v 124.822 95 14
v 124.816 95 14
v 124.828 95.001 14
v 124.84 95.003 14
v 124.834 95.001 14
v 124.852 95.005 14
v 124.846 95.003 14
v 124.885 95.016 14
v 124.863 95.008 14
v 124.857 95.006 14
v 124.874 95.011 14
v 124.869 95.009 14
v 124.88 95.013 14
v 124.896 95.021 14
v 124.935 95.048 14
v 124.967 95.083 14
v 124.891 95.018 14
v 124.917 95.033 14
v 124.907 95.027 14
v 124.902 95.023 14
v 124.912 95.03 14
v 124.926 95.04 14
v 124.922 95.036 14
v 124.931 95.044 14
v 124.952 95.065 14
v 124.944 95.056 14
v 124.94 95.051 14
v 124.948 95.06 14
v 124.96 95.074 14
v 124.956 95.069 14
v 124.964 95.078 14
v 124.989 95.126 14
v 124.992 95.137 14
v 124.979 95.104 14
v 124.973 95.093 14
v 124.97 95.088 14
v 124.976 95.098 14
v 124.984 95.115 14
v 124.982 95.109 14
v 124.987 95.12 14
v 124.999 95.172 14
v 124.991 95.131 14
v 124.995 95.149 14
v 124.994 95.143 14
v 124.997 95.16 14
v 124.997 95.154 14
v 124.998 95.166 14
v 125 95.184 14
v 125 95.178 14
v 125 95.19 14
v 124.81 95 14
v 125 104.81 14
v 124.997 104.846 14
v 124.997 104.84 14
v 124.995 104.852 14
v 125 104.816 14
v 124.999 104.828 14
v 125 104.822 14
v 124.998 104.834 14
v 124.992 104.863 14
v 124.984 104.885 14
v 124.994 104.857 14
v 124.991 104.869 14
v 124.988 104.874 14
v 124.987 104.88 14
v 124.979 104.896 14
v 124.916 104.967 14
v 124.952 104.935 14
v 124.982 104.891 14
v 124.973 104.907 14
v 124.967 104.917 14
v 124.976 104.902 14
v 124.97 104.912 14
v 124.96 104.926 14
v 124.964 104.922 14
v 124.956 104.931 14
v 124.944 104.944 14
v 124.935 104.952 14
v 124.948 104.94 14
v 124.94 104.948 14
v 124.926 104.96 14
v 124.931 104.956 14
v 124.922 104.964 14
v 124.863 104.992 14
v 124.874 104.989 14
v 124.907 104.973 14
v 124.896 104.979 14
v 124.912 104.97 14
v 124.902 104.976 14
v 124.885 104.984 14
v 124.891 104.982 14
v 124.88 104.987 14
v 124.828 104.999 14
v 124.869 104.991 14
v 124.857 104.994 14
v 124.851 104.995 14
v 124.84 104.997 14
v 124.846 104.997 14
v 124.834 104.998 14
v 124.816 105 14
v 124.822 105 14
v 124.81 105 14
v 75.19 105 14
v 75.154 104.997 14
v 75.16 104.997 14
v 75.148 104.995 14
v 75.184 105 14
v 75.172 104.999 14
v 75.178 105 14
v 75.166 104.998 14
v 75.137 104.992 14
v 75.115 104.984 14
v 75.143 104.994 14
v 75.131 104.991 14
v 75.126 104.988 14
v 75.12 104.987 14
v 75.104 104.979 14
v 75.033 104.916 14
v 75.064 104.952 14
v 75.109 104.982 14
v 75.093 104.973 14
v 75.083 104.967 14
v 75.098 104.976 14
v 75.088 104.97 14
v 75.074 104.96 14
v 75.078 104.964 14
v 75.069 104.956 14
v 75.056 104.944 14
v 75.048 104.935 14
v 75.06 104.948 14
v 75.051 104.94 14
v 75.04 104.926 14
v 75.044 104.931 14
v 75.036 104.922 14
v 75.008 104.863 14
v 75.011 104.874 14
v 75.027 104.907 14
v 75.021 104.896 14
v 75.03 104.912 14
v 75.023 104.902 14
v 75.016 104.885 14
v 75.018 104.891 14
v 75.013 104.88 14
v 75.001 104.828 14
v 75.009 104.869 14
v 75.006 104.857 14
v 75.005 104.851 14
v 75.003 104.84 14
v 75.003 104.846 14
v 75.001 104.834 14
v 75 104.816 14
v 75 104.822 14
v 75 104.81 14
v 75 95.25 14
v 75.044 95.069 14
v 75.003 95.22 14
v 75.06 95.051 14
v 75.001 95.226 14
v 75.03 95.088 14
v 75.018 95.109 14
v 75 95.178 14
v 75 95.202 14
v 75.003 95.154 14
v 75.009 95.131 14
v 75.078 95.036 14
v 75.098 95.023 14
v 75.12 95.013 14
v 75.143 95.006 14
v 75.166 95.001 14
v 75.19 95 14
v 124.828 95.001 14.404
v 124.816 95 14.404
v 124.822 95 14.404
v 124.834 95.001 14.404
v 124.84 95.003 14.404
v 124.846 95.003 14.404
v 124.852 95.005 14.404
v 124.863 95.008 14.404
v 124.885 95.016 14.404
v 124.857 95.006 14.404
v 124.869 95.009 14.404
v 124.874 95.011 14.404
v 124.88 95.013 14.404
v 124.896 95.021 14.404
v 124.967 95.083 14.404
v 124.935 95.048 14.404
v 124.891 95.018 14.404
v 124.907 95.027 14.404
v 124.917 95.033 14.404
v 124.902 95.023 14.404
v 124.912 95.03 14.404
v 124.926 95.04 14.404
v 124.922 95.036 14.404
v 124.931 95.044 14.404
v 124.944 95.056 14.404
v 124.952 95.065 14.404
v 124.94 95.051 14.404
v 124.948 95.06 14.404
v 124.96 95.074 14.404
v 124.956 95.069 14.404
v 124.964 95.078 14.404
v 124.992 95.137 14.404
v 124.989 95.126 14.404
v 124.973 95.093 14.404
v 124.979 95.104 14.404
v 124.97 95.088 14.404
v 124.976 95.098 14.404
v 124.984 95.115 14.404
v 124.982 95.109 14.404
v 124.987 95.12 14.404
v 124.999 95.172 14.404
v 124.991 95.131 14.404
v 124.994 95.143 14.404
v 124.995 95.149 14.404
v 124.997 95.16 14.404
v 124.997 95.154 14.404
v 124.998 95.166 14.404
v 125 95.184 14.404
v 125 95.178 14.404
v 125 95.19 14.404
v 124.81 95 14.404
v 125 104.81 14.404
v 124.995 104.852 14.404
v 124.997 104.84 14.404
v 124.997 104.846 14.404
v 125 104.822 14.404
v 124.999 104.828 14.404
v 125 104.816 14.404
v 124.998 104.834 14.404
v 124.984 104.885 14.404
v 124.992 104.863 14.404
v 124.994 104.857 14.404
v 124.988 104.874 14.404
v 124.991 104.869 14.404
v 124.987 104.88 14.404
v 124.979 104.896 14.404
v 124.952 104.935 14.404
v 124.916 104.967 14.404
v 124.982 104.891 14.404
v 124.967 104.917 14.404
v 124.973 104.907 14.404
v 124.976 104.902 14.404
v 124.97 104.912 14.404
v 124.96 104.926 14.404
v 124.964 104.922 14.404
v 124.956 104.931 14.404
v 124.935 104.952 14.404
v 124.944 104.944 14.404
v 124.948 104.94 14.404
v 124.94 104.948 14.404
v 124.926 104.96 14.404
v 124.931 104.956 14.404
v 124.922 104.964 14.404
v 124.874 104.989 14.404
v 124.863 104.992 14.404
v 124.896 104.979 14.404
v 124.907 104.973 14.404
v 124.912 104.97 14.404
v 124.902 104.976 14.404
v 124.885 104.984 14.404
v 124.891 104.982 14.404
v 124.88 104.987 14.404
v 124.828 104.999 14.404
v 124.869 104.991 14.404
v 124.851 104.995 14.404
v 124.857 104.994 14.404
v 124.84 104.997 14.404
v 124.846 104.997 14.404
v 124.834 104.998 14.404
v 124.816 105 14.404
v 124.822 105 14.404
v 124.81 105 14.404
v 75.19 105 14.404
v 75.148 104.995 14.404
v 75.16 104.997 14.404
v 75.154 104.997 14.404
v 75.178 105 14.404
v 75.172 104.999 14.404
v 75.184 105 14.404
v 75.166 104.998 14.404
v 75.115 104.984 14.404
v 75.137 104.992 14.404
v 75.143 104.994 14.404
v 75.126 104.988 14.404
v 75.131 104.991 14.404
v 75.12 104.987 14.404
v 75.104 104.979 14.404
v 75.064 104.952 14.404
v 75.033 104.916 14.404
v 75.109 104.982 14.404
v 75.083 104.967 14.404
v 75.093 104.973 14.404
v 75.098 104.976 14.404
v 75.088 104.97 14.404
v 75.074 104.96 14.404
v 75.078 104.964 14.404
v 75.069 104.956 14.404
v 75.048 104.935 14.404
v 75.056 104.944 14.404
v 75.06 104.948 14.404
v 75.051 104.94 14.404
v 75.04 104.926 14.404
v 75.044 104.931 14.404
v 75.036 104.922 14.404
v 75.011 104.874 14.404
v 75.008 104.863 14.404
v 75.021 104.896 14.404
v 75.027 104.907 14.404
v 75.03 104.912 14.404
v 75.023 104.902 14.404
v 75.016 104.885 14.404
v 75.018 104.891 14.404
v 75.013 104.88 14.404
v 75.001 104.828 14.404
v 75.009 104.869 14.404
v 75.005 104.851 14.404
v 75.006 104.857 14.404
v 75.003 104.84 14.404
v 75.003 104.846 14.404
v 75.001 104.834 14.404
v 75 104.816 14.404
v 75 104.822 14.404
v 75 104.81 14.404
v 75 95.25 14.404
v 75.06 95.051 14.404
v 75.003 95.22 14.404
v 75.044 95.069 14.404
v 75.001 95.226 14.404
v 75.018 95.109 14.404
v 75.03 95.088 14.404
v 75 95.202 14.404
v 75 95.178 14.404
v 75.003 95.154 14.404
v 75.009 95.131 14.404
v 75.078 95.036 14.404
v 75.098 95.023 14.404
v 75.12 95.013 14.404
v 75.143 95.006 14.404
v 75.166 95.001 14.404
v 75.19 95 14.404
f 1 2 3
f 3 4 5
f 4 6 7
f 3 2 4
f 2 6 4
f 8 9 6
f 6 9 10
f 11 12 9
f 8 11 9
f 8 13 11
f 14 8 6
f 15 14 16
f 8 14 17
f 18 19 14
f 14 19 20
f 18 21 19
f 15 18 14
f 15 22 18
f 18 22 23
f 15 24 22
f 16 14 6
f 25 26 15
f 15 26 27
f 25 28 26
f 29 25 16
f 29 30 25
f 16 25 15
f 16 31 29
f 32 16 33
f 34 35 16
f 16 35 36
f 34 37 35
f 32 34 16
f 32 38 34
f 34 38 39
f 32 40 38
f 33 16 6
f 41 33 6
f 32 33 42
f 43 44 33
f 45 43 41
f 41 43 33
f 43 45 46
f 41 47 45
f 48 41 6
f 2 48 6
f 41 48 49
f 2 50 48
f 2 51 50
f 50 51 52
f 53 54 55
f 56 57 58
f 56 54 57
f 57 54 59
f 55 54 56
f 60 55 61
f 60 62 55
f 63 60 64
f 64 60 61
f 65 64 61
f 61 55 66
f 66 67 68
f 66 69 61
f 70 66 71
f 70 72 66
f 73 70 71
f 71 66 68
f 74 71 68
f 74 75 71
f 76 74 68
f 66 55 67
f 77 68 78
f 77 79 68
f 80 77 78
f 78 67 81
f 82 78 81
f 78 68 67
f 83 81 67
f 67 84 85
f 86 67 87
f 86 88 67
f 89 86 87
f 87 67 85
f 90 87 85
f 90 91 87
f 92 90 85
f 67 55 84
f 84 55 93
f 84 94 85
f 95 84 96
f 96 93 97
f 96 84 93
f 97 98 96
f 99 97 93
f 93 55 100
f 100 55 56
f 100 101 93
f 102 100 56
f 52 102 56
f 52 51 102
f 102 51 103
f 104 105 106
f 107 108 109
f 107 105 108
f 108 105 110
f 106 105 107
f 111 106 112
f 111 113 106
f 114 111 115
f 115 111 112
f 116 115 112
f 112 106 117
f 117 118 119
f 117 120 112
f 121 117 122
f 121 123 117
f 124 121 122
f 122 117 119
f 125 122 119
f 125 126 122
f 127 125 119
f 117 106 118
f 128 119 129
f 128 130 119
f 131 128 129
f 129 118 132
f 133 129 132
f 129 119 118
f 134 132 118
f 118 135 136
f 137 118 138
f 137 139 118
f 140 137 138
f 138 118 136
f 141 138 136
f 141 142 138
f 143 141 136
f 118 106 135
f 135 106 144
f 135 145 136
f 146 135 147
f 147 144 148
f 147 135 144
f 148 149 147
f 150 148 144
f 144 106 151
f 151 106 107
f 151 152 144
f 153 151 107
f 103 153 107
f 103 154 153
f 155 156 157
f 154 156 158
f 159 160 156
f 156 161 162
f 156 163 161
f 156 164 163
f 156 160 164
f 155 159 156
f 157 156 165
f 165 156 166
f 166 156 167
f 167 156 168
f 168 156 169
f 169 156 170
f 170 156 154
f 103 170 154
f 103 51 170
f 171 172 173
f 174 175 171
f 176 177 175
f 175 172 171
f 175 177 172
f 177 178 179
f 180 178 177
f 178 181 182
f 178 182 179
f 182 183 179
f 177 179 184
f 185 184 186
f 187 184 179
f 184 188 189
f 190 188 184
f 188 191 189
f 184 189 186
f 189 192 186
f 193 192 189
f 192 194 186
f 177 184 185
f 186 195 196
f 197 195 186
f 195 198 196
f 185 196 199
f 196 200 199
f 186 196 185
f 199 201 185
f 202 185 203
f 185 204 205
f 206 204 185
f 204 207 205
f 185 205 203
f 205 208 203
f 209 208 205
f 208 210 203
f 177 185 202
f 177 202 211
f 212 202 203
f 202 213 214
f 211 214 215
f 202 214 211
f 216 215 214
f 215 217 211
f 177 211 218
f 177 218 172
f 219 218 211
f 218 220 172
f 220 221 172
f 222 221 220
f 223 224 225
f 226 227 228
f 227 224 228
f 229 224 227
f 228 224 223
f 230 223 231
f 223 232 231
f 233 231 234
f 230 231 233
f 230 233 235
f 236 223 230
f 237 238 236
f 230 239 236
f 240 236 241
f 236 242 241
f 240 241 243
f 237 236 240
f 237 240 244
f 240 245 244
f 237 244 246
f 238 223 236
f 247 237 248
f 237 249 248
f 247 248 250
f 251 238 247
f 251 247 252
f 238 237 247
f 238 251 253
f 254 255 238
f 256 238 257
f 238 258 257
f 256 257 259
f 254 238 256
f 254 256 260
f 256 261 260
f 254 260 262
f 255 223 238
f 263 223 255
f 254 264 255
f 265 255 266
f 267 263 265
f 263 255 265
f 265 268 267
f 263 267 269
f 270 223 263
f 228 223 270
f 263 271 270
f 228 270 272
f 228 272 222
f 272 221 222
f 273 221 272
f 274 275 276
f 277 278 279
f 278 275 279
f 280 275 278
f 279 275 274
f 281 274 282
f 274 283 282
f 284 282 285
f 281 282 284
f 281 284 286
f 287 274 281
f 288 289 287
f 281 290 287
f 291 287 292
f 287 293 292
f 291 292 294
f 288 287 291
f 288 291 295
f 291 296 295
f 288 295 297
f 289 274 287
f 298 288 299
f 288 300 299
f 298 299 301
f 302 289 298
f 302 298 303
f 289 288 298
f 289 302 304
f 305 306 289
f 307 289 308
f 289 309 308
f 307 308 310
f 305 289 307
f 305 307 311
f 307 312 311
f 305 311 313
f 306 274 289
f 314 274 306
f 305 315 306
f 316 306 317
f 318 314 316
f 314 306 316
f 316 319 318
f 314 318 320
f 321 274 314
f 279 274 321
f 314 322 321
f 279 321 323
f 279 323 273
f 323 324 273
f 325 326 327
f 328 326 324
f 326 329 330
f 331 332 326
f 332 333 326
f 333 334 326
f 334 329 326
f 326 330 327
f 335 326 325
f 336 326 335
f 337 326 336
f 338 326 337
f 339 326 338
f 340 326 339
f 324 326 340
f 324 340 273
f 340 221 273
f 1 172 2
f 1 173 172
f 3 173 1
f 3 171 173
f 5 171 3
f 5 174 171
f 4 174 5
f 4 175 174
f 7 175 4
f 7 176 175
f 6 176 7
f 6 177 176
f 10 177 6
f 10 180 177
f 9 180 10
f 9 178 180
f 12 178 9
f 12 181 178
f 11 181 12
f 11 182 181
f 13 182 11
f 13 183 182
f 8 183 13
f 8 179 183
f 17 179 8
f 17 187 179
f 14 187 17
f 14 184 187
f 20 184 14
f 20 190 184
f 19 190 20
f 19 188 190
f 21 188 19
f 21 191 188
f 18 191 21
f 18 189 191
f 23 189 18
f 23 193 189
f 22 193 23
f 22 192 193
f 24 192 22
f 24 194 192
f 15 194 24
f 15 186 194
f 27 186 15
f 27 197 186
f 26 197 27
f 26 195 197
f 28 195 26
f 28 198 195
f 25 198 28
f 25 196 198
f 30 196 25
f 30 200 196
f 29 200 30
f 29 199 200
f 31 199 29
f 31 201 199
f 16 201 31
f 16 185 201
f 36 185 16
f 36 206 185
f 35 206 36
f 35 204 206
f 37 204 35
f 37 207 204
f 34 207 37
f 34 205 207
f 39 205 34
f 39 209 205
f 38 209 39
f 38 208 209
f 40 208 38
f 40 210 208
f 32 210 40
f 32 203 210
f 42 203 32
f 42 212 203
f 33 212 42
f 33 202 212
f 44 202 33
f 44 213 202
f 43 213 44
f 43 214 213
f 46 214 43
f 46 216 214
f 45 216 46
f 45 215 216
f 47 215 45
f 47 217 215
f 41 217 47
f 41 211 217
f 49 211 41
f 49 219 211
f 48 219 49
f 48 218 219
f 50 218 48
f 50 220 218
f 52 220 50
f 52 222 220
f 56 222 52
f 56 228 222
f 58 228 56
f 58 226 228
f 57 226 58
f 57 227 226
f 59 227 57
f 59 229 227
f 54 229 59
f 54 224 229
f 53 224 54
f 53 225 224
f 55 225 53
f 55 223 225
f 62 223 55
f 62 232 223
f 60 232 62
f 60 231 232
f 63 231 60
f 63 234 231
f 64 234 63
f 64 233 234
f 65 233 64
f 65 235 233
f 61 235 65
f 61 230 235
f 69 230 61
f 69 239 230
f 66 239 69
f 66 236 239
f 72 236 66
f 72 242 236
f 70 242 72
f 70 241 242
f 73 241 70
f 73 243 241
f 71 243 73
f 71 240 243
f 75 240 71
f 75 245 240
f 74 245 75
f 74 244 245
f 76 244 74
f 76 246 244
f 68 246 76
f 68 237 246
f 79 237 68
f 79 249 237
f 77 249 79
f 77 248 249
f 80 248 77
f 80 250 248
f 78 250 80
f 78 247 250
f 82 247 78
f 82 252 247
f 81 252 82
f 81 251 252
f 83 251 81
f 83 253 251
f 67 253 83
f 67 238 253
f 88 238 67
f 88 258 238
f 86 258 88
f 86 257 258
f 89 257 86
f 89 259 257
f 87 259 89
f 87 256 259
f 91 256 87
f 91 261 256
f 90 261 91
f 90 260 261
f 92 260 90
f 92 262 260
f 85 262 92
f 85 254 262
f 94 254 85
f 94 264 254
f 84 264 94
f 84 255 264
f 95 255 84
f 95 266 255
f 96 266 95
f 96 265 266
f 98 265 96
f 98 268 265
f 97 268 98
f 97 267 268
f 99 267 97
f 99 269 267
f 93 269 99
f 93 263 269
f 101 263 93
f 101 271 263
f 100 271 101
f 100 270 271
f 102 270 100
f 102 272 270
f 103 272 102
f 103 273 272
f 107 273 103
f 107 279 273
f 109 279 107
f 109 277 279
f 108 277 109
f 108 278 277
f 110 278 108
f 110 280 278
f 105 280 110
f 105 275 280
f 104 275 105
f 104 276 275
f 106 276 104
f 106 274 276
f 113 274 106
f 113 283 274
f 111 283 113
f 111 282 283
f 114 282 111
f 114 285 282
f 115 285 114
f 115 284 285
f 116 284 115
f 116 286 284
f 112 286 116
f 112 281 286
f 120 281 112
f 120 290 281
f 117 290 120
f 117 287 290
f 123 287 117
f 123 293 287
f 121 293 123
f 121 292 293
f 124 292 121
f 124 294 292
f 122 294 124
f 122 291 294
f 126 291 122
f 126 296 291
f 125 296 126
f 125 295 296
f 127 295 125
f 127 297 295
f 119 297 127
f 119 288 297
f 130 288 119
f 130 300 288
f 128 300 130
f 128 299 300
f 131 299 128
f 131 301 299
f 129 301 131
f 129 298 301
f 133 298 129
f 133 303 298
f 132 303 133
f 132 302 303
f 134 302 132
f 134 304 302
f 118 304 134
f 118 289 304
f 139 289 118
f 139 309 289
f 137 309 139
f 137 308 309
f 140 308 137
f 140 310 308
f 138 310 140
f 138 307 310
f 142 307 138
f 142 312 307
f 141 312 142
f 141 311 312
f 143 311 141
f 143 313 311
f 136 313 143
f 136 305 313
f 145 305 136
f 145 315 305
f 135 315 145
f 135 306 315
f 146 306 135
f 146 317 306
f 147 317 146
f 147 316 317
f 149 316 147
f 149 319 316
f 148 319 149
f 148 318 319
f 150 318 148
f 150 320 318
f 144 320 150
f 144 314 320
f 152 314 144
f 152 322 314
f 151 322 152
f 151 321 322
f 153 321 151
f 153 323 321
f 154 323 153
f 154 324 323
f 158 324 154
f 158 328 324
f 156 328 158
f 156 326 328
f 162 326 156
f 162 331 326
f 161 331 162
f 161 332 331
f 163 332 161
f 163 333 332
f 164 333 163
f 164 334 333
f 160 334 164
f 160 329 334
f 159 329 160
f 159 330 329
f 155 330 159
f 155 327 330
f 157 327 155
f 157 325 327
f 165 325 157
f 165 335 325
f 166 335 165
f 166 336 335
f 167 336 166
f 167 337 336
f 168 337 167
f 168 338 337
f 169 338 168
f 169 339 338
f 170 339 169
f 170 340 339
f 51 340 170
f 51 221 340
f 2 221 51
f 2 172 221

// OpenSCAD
module drawBasicShape(x1, y1, x2, y2, width)
{
	length = sqrt((x1-x2)*(x1-x2) + (y1-y2)*(y1-y2));
	if (width!=0.0) {
		square(size = [width, length], center = false);
		translate([width/2.0, 0, 0]) circle(d=width);
		translate([width/2.0, length, 0]) circle(d=width);
	}
}

module translateAndRotate(x1, y1, x2, y2, width)
{
	if (width != 0.0) {
		angle = atan((y2-y1)/(x2-x1)) +270;
		if (x2>=x1) {
			translate([x1, y1, 0.0]) rotate([0.0, 0.0, angle]) translate([-width/2.0, 0.0, 0.0]) scale([1.0, 1.0, 1.0]) drawBasicShape(x1, y1, x2, y2, width);
		}
		else {
			translate([x1, y1, 0.0]) rotate([0.0, 0.0, angle+180]) translate([-width/2.0, 0.0, 0.0]) scale([1.0, 1.0, 1.0]) drawBasicShape(x1, y1, x2, y2, width);		}
	}
}

$fn=50;

points34 = [
[75.77800000, 95.77800000, 0.00000000],
[124.22200000, 95.77800000, 0.37999548],
[124.22200000, 104.22200000, 0.37997788],
[75.77800000, 104.22200000, 0.37999672],
[75.77800000, 95.83800000, 0.37997423],
[75.48400000, 95.48400000, 0.00000000],
[124.51600000, 95.48400000, 0.37999868],
[124.51600000, 104.51600000, 0.37998977],
[75.48400000, 104.51600000, 0.37999746],
[75.48400000, 95.54400000, 0.37999314],
[75.19000000, 95.19000000, 0.00000000],
[124.81000000, 95.19000000, 0.37999939],
[124.81000000, 104.81000000, 0.38000021],
[75.19000000, 104.81000000, 0.38000060],
[75.19000000, 95.25000000, 0.37999715],
[75.53600000, 95.39000000, 0.00000000],
[75.94600000, 103.88900000, 0.00000000],
[76.11100000, 104.05400000, 0.37961375],
[76.52800000, 104.05400000, 0.38001190],
[75.94600000, 103.47200000, 0.37989934],
[75.94600000, 103.05500000, 0.38015610],
[76.94500000, 104.05400000, 0.37994651],
[77.36200000, 104.05400000, 0.38001190],
[75.94600000, 102.63800000, 0.37999592],
[75.94600000, 102.22100000, 0.38001190],
[77.77900000, 104.05400000, 0.37999966],
[78.19600000, 104.05400000, 0.38001190],
[75.94600000, 101.80400000, 0.38002091],
[75.94600000, 101.38700000, 0.38001190],
[78.61300000, 104.05400000, 0.38001957],
[79.03000000, 104.05400000, 0.38001190],
[75.94600000, 100.97000000, 0.38001859],
[75.94600000, 100.55300000, 0.38001190],
[79.44700000, 104.05400000, 0.38002999],
[79.86400000, 104.05400000, 0.38001190],
[75.94600000, 100.13600000, 0.38002811],
[75.94600000, 99.71900000, 0.38001190],
[80.28100000, 104.05400000, 0.38002660],
[80.69800000, 104.05400000, 0.38001190],
[75.94600000, 99.30200000, 0.38003429],
[75.94600000, 98.88500000, 0.38001190],
[81.11500000, 104.05400000, 0.38003252],
[81.53300000, 104.05400000, 0.37930814],
[75.94600000, 98.46700000, 0.37997836],
[75.94600000, 98.05000000, 0.38001190],
[81.95000000, 104.05400000, 0.37998072],
[82.36700000, 104.05400000, 0.38015610],
[75.94600000, 97.63300000, 0.37998277],
[75.94600000, 97.21600000, 0.38015610],
[82.78400000, 104.05400000, 0.37999079],
[83.20100000, 104.05400000, 0.38001190],
[75.94600000, 96.79900000, 0.37999203],
[75.94600000, 96.38200000, 0.38001190],
[83.61800000, 104.05400000, 0.37999868],
[84.03500000, 104.05400000, 0.38001190],
[75.95600000, 95.97600000, 0.38000275],
[76.34400000, 95.94600000, 0.37958004],
[84.45200000, 104.05400000, 0.38000754],
[84.86900000, 104.05400000, 0.38001190],
[76.76100000, 95.94600000, 0.38000229],
[77.17800000, 95.94600000, 0.38001190],
[85.28600000, 104.05400000, 0.38000754],
[85.70300000, 104.05400000, 0.38001190],
[77.59500000, 95.94600000, 0.38000229],
[78.01200000, 95.94600000, 0.38015610],
[86.12000000, 104.05400000, 0.38000229],
[86.53700000, 104.05400000, 0.38001190],
[78.42900000, 95.94600000, 0.38000754],
[78.84600000, 95.94600000, 0.38001190],
[86.95400000, 104.05400000, 0.38000229],
[87.37100000, 104.05400000, 0.38001190],
[79.26300000, 95.94600000, 0.38000754],
[79.68000000, 95.94600000, 0.38001190],
[87.78900000, 104.05400000, 0.37998415],
[88.20600000, 104.05400000, 0.38015610],
[80.09700000, 95.94600000, 0.37998415],
[80.51500000, 95.94600000, 0.37930814],
[88.62300000, 104.05400000, 0.38000229],
[89.04000000, 104.05400000, 0.38015610],
[80.93200000, 95.94600000, 0.38000229],
[81.34900000, 95.94600000, 0.38001190],
[89.45700000, 104.05400000, 0.38000754],
[89.87400000, 104.05400000, 0.38001190],
[81.76600000, 95.94600000, 0.38000229],
[82.18300000, 95.94600000, 0.38015610],
[90.29100000, 104.05400000, 0.38000229],
[90.70800000, 104.05400000, 0.38001190],
[82.60000000, 95.94600000, 0.38000229],
[83.01700000, 95.94600000, 0.38015610],
[91.12500000, 104.05400000, 0.38000229],
[91.54200000, 104.05400000, 0.38001190],
[83.43400000, 95.94600000, 0.38000754],
[83.85100000, 95.94600000, 0.38001190],
[91.95900000, 104.05400000, 0.38000229],
[92.37600000, 104.05400000, 0.38001190],
[84.26800000, 95.94600000, 0.38000754],
[84.68500000, 95.94600000, 0.38001190],
[92.79300000, 104.05400000, 0.38000229],
[93.21000000, 104.05400000, 0.38015610],
[85.10200000, 95.94600000, 0.38000229],
[85.51900000, 95.94600000, 0.38001190],
[93.62700000, 104.05400000, 0.38000754],
[94.04400000, 104.05400000, 0.38001190],
[85.93600000, 95.94600000, 0.38000229],
[86.35300000, 95.94600000, 0.38001190],
[94.46200000, 104.05400000, 0.37998940],
[94.87900000, 104.05400000, 0.38001190],
[86.77000000, 95.94600000, 0.37998415],
[87.18800000, 95.94600000, 0.37945200],
[95.29600000, 104.05400000, 0.38000229],
[95.71300000, 104.05400000, 0.38001190],
[87.60500000, 95.94600000, 0.38000754],
[88.02200000, 95.94600000, 0.38001190],
[96.13000000, 104.05400000, 0.38000229],
[96.54700000, 104.05400000, 0.38001190],
[88.43900000, 95.94600000, 0.38000754],
[88.85600000, 95.94600000, 0.38001190],
[96.96400000, 104.05400000, 0.38000229],
[97.38100000, 104.05400000, 0.38015610],
[89.27300000, 95.94600000, 0.38000229],
[89.69000000, 95.94600000, 0.38001190],
[97.79800000, 104.05400000, 0.38000754],
[98.21500000, 104.05400000, 0.38001190],
[90.10700000, 95.94600000, 0.38000229],
[90.52400000, 95.94600000, 0.38001190],
[98.63200000, 104.05400000, 0.38000754],
[99.04900000, 104.05400000, 0.38001190],
[90.94100000, 95.94600000, 0.38000229],
[91.35800000, 95.94600000, 0.38015610],
[99.46600000, 104.05400000, 0.38000229],
[99.88300000, 104.05400000, 0.38001190],
[91.77500000, 95.94600000, 0.38000754],
[92.19200000, 95.94600000, 0.38001190],
[100.30000000, 104.05400000, 0.38000229],
[100.71800000, 104.05400000, 0.37930814],
[92.60900000, 95.94600000, 0.37998940],
[93.02600000, 95.94600000, 0.38001190],
[101.13500000, 104.05400000, 0.37998415],
[101.55200000, 104.05400000, 0.38015610],
[93.44400000, 95.94600000, 0.38000229],
[93.86100000, 95.94600000, 0.38001190],
[101.96900000, 104.05400000, 0.38000754],
[102.38600000, 104.05400000, 0.38001190],
[94.27800000, 95.94600000, 0.38000229],
[94.69500000, 95.94600000, 0.38001190],
[102.80300000, 104.05400000, 0.38000754],
[103.22000000, 104.05400000, 0.38001190],
[95.11200000, 95.94600000, 0.38000229],
[95.52900000, 95.94600000, 0.38015610],
[103.63700000, 104.05400000, 0.38000229],
[104.05400000, 104.05400000, 0.38001190],
[95.94600000, 95.94600000, 0.38000754],
[96.36300000, 95.94600000, 0.38001190],
[104.47100000, 104.05400000, 0.38000229],
[104.88800000, 104.05400000, 0.38001190],
[96.78000000, 95.94600000, 0.38000754],
[97.19700000, 95.94600000, 0.38001190],
[105.30500000, 104.05400000, 0.38000229],
[105.72200000, 104.05400000, 0.38015610],
[97.61400000, 95.94600000, 0.38000229],
[98.03100000, 95.94600000, 0.38001190],
[106.13900000, 104.05400000, 0.38000229],
[106.55600000, 104.05400000, 0.38015610],
[98.44800000, 95.94600000, 0.38000229],
[98.86500000, 95.94600000, 0.38001190],
[106.97300000, 104.05400000, 0.38000754],
[107.39100000, 104.05400000, 0.37930814],
[99.28200000, 95.94600000, 0.37998415],
[99.69900000, 95.94600000, 0.38001190],
[107.80800000, 104.05400000, 0.37998940],
[108.22500000, 104.05400000, 0.38001190],
[100.11700000, 95.94600000, 0.38000229],
[100.53400000, 95.94600000, 0.38015610],
[108.64200000, 104.05400000, 0.38000229],
[109.05900000, 104.05400000, 0.38001190],
[100.95100000, 95.94600000, 0.38000754],
[101.36800000, 95.94600000, 0.38001190],
[109.47600000, 104.05400000, 0.38000229],
[109.89300000, 104.05400000, 0.38001190],
[101.78500000, 95.94600000, 0.38000754],
[102.20200000, 95.94600000, 0.38001190],
[110.31000000, 104.05400000, 0.38000229],
[110.72700000, 104.05400000, 0.38015610],
[102.61900000, 95.94600000, 0.38000229],
[103.03600000, 95.94600000, 0.38001190],
[111.14400000, 104.05400000, 0.38000754],
[111.56100000, 104.05400000, 0.38001190],
[103.45300000, 95.94600000, 0.38000229],
[103.87000000, 95.94600000, 0.38001190],
[111.97800000, 104.05400000, 0.38000754],
[112.39500000, 104.05400000, 0.38001190],
[104.28700000, 95.94600000, 0.38000229],
[104.70400000, 95.94600000, 0.38015610],
[112.81200000, 104.05400000, 0.38000229],
[113.22900000, 104.05400000, 0.38001190],
[105.12100000, 95.94600000, 0.38000754],
[105.53800000, 95.94600000, 0.38001190],
[113.64700000, 104.05400000, 0.37998415],
[114.06400000, 104.05400000, 0.38001190],
[105.95500000, 95.94600000, 0.37998940],
[106.37300000, 95.94600000, 0.37930814],
[114.48100000, 104.05400000, 0.38000229],
[114.89800000, 104.05400000, 0.38015610],
[106.79000000, 95.94600000, 0.38000229],
[107.20700000, 95.94600000, 0.38001190],
[115.31500000, 104.05400000, 0.38000754],
[115.73200000, 104.05400000, 0.38001190],
[107.62400000, 95.94600000, 0.38000229],
[108.04100000, 95.94600000, 0.38001190],
[116.14900000, 104.05400000, 0.38000754],
[116.56600000, 104.05400000, 0.38001190],
[108.45800000, 95.94600000, 0.38000229],
[108.87500000, 95.94600000, 0.38015610],
[116.98300000, 104.05400000, 0.38000229],
[117.40000000, 104.05400000, 0.38001190],
[109.29200000, 95.94600000, 0.38000754],
[109.70900000, 95.94600000, 0.38001190],
[117.81700000, 104.05400000, 0.38000229],
[118.23400000, 104.05400000, 0.38001190],
[110.12600000, 95.94600000, 0.38000754],
[110.54300000, 95.94600000, 0.38001190],
[118.65100000, 104.05400000, 0.38000229],
[119.06800000, 104.05400000, 0.38015610],
[110.96000000, 95.94600000, 0.38000229],
[111.37700000, 95.94600000, 0.38001190],
[119.48500000, 104.05400000, 0.38000229],
[119.90200000, 104.05400000, 0.38015610],
[111.79400000, 95.94600000, 0.38000229],
[112.21100000, 95.94600000, 0.38001190],
[120.32000000, 104.05400000, 0.37998940],
[120.73700000, 104.05400000, 0.38001190],
[112.62900000, 95.94600000, 0.38000229],
[113.04600000, 95.94600000, 0.38001190],
[121.15400000, 104.05400000, 0.38000754],
[121.57100000, 104.05400000, 0.38001190],
[113.46300000, 95.94600000, 0.38000229],
[113.88000000, 95.94600000, 0.38015610],
[121.98800000, 104.05400000, 0.38000229],
[122.40500000, 104.05400000, 0.38001190],
[114.29700000, 95.94600000, 0.38000754],
[114.71400000, 95.94600000, 0.38001190],
[122.82200000, 104.05400000, 0.38000229],
[123.23900000, 104.05400000, 0.38001190],
[115.13100000, 95.94600000, 0.38000754],
[115.54800000, 95.94600000, 0.38001190],
[123.65600000, 104.05400000, 0.38000229],
[124.04400000, 104.02500000, 0.37979183],
[115.96500000, 95.94600000, 0.37998455],
[116.38200000, 95.94600000, 0.38001190],
[124.05400000, 103.61800000, 0.37999868],
[124.05400000, 103.20100000, 0.38001190],
[116.79900000, 95.94600000, 0.37999789],
[117.21600000, 95.94600000, 0.38001190],
[124.05400000, 102.78400000, 0.37999079],
[124.05400000, 102.36700000, 0.38015610],
[117.63300000, 95.94600000, 0.37998939],
[118.05000000, 95.94600000, 0.38001190],
[124.05400000, 101.95000000, 0.37998780],
[124.05400000, 101.53300000, 0.38001190],
[118.46700000, 95.94600000, 0.37997836],
[118.88400000, 95.94600000, 0.38001190],
[124.05400000, 101.11600000, 0.37997562],
[124.05400000, 100.69800000, 0.37945200],
[119.30200000, 95.94600000, 0.38002534],
[119.71900000, 95.94600000, 0.38015610],
[124.05400000, 100.28100000, 0.38002660],
[124.05400000, 99.86400000, 0.38001190],
[120.13600000, 95.94600000, 0.38002811],
[120.55300000, 95.94600000, 0.38015610],
[124.05400000, 99.44700000, 0.38001785],
[124.05400000, 99.03000000, 0.38015610],
[120.97000000, 95.94600000, 0.38001859],
[121.38700000, 95.94600000, 0.38001190],
[124.05400000, 98.61300000, 0.38001957],
[124.05400000, 98.19600000, 0.38015610],
[121.80400000, 95.94600000, 0.38000201],
[122.22100000, 95.94600000, 0.38015610],
[124.05400000, 97.77900000, 0.37999966],
[124.05400000, 97.36200000, 0.38001190],
[122.63800000, 95.94600000, 0.37999592],
[123.05500000, 95.94600000, 0.38015610],
[124.05400000, 96.94500000, 0.37994651],
[124.05400000, 96.52800000, 0.38015610],
[123.47200000, 95.94600000, 0.37989934],
[123.88900000, 95.94600000, 0.38001190],
[124.05400000, 96.11100000, 0.37961375],
];

translate([0.0, 0.0, 14.00000000]) {
	linear_extrude(height = 0.40400000, center = false, convexity = 10, twist = 0) {
		union() {
			for( i=[0:len(points34)-2] ){ 
				x1 = points34[i][0];
				y1 = points34[i][1];
				x2 = points34[i+1][0];
				y2 = points34[i+1][1];
				width = points34[i+1][2];
				translateAndRotate(x1, y1, x2, y2, width);
			}
		}
	}
}
